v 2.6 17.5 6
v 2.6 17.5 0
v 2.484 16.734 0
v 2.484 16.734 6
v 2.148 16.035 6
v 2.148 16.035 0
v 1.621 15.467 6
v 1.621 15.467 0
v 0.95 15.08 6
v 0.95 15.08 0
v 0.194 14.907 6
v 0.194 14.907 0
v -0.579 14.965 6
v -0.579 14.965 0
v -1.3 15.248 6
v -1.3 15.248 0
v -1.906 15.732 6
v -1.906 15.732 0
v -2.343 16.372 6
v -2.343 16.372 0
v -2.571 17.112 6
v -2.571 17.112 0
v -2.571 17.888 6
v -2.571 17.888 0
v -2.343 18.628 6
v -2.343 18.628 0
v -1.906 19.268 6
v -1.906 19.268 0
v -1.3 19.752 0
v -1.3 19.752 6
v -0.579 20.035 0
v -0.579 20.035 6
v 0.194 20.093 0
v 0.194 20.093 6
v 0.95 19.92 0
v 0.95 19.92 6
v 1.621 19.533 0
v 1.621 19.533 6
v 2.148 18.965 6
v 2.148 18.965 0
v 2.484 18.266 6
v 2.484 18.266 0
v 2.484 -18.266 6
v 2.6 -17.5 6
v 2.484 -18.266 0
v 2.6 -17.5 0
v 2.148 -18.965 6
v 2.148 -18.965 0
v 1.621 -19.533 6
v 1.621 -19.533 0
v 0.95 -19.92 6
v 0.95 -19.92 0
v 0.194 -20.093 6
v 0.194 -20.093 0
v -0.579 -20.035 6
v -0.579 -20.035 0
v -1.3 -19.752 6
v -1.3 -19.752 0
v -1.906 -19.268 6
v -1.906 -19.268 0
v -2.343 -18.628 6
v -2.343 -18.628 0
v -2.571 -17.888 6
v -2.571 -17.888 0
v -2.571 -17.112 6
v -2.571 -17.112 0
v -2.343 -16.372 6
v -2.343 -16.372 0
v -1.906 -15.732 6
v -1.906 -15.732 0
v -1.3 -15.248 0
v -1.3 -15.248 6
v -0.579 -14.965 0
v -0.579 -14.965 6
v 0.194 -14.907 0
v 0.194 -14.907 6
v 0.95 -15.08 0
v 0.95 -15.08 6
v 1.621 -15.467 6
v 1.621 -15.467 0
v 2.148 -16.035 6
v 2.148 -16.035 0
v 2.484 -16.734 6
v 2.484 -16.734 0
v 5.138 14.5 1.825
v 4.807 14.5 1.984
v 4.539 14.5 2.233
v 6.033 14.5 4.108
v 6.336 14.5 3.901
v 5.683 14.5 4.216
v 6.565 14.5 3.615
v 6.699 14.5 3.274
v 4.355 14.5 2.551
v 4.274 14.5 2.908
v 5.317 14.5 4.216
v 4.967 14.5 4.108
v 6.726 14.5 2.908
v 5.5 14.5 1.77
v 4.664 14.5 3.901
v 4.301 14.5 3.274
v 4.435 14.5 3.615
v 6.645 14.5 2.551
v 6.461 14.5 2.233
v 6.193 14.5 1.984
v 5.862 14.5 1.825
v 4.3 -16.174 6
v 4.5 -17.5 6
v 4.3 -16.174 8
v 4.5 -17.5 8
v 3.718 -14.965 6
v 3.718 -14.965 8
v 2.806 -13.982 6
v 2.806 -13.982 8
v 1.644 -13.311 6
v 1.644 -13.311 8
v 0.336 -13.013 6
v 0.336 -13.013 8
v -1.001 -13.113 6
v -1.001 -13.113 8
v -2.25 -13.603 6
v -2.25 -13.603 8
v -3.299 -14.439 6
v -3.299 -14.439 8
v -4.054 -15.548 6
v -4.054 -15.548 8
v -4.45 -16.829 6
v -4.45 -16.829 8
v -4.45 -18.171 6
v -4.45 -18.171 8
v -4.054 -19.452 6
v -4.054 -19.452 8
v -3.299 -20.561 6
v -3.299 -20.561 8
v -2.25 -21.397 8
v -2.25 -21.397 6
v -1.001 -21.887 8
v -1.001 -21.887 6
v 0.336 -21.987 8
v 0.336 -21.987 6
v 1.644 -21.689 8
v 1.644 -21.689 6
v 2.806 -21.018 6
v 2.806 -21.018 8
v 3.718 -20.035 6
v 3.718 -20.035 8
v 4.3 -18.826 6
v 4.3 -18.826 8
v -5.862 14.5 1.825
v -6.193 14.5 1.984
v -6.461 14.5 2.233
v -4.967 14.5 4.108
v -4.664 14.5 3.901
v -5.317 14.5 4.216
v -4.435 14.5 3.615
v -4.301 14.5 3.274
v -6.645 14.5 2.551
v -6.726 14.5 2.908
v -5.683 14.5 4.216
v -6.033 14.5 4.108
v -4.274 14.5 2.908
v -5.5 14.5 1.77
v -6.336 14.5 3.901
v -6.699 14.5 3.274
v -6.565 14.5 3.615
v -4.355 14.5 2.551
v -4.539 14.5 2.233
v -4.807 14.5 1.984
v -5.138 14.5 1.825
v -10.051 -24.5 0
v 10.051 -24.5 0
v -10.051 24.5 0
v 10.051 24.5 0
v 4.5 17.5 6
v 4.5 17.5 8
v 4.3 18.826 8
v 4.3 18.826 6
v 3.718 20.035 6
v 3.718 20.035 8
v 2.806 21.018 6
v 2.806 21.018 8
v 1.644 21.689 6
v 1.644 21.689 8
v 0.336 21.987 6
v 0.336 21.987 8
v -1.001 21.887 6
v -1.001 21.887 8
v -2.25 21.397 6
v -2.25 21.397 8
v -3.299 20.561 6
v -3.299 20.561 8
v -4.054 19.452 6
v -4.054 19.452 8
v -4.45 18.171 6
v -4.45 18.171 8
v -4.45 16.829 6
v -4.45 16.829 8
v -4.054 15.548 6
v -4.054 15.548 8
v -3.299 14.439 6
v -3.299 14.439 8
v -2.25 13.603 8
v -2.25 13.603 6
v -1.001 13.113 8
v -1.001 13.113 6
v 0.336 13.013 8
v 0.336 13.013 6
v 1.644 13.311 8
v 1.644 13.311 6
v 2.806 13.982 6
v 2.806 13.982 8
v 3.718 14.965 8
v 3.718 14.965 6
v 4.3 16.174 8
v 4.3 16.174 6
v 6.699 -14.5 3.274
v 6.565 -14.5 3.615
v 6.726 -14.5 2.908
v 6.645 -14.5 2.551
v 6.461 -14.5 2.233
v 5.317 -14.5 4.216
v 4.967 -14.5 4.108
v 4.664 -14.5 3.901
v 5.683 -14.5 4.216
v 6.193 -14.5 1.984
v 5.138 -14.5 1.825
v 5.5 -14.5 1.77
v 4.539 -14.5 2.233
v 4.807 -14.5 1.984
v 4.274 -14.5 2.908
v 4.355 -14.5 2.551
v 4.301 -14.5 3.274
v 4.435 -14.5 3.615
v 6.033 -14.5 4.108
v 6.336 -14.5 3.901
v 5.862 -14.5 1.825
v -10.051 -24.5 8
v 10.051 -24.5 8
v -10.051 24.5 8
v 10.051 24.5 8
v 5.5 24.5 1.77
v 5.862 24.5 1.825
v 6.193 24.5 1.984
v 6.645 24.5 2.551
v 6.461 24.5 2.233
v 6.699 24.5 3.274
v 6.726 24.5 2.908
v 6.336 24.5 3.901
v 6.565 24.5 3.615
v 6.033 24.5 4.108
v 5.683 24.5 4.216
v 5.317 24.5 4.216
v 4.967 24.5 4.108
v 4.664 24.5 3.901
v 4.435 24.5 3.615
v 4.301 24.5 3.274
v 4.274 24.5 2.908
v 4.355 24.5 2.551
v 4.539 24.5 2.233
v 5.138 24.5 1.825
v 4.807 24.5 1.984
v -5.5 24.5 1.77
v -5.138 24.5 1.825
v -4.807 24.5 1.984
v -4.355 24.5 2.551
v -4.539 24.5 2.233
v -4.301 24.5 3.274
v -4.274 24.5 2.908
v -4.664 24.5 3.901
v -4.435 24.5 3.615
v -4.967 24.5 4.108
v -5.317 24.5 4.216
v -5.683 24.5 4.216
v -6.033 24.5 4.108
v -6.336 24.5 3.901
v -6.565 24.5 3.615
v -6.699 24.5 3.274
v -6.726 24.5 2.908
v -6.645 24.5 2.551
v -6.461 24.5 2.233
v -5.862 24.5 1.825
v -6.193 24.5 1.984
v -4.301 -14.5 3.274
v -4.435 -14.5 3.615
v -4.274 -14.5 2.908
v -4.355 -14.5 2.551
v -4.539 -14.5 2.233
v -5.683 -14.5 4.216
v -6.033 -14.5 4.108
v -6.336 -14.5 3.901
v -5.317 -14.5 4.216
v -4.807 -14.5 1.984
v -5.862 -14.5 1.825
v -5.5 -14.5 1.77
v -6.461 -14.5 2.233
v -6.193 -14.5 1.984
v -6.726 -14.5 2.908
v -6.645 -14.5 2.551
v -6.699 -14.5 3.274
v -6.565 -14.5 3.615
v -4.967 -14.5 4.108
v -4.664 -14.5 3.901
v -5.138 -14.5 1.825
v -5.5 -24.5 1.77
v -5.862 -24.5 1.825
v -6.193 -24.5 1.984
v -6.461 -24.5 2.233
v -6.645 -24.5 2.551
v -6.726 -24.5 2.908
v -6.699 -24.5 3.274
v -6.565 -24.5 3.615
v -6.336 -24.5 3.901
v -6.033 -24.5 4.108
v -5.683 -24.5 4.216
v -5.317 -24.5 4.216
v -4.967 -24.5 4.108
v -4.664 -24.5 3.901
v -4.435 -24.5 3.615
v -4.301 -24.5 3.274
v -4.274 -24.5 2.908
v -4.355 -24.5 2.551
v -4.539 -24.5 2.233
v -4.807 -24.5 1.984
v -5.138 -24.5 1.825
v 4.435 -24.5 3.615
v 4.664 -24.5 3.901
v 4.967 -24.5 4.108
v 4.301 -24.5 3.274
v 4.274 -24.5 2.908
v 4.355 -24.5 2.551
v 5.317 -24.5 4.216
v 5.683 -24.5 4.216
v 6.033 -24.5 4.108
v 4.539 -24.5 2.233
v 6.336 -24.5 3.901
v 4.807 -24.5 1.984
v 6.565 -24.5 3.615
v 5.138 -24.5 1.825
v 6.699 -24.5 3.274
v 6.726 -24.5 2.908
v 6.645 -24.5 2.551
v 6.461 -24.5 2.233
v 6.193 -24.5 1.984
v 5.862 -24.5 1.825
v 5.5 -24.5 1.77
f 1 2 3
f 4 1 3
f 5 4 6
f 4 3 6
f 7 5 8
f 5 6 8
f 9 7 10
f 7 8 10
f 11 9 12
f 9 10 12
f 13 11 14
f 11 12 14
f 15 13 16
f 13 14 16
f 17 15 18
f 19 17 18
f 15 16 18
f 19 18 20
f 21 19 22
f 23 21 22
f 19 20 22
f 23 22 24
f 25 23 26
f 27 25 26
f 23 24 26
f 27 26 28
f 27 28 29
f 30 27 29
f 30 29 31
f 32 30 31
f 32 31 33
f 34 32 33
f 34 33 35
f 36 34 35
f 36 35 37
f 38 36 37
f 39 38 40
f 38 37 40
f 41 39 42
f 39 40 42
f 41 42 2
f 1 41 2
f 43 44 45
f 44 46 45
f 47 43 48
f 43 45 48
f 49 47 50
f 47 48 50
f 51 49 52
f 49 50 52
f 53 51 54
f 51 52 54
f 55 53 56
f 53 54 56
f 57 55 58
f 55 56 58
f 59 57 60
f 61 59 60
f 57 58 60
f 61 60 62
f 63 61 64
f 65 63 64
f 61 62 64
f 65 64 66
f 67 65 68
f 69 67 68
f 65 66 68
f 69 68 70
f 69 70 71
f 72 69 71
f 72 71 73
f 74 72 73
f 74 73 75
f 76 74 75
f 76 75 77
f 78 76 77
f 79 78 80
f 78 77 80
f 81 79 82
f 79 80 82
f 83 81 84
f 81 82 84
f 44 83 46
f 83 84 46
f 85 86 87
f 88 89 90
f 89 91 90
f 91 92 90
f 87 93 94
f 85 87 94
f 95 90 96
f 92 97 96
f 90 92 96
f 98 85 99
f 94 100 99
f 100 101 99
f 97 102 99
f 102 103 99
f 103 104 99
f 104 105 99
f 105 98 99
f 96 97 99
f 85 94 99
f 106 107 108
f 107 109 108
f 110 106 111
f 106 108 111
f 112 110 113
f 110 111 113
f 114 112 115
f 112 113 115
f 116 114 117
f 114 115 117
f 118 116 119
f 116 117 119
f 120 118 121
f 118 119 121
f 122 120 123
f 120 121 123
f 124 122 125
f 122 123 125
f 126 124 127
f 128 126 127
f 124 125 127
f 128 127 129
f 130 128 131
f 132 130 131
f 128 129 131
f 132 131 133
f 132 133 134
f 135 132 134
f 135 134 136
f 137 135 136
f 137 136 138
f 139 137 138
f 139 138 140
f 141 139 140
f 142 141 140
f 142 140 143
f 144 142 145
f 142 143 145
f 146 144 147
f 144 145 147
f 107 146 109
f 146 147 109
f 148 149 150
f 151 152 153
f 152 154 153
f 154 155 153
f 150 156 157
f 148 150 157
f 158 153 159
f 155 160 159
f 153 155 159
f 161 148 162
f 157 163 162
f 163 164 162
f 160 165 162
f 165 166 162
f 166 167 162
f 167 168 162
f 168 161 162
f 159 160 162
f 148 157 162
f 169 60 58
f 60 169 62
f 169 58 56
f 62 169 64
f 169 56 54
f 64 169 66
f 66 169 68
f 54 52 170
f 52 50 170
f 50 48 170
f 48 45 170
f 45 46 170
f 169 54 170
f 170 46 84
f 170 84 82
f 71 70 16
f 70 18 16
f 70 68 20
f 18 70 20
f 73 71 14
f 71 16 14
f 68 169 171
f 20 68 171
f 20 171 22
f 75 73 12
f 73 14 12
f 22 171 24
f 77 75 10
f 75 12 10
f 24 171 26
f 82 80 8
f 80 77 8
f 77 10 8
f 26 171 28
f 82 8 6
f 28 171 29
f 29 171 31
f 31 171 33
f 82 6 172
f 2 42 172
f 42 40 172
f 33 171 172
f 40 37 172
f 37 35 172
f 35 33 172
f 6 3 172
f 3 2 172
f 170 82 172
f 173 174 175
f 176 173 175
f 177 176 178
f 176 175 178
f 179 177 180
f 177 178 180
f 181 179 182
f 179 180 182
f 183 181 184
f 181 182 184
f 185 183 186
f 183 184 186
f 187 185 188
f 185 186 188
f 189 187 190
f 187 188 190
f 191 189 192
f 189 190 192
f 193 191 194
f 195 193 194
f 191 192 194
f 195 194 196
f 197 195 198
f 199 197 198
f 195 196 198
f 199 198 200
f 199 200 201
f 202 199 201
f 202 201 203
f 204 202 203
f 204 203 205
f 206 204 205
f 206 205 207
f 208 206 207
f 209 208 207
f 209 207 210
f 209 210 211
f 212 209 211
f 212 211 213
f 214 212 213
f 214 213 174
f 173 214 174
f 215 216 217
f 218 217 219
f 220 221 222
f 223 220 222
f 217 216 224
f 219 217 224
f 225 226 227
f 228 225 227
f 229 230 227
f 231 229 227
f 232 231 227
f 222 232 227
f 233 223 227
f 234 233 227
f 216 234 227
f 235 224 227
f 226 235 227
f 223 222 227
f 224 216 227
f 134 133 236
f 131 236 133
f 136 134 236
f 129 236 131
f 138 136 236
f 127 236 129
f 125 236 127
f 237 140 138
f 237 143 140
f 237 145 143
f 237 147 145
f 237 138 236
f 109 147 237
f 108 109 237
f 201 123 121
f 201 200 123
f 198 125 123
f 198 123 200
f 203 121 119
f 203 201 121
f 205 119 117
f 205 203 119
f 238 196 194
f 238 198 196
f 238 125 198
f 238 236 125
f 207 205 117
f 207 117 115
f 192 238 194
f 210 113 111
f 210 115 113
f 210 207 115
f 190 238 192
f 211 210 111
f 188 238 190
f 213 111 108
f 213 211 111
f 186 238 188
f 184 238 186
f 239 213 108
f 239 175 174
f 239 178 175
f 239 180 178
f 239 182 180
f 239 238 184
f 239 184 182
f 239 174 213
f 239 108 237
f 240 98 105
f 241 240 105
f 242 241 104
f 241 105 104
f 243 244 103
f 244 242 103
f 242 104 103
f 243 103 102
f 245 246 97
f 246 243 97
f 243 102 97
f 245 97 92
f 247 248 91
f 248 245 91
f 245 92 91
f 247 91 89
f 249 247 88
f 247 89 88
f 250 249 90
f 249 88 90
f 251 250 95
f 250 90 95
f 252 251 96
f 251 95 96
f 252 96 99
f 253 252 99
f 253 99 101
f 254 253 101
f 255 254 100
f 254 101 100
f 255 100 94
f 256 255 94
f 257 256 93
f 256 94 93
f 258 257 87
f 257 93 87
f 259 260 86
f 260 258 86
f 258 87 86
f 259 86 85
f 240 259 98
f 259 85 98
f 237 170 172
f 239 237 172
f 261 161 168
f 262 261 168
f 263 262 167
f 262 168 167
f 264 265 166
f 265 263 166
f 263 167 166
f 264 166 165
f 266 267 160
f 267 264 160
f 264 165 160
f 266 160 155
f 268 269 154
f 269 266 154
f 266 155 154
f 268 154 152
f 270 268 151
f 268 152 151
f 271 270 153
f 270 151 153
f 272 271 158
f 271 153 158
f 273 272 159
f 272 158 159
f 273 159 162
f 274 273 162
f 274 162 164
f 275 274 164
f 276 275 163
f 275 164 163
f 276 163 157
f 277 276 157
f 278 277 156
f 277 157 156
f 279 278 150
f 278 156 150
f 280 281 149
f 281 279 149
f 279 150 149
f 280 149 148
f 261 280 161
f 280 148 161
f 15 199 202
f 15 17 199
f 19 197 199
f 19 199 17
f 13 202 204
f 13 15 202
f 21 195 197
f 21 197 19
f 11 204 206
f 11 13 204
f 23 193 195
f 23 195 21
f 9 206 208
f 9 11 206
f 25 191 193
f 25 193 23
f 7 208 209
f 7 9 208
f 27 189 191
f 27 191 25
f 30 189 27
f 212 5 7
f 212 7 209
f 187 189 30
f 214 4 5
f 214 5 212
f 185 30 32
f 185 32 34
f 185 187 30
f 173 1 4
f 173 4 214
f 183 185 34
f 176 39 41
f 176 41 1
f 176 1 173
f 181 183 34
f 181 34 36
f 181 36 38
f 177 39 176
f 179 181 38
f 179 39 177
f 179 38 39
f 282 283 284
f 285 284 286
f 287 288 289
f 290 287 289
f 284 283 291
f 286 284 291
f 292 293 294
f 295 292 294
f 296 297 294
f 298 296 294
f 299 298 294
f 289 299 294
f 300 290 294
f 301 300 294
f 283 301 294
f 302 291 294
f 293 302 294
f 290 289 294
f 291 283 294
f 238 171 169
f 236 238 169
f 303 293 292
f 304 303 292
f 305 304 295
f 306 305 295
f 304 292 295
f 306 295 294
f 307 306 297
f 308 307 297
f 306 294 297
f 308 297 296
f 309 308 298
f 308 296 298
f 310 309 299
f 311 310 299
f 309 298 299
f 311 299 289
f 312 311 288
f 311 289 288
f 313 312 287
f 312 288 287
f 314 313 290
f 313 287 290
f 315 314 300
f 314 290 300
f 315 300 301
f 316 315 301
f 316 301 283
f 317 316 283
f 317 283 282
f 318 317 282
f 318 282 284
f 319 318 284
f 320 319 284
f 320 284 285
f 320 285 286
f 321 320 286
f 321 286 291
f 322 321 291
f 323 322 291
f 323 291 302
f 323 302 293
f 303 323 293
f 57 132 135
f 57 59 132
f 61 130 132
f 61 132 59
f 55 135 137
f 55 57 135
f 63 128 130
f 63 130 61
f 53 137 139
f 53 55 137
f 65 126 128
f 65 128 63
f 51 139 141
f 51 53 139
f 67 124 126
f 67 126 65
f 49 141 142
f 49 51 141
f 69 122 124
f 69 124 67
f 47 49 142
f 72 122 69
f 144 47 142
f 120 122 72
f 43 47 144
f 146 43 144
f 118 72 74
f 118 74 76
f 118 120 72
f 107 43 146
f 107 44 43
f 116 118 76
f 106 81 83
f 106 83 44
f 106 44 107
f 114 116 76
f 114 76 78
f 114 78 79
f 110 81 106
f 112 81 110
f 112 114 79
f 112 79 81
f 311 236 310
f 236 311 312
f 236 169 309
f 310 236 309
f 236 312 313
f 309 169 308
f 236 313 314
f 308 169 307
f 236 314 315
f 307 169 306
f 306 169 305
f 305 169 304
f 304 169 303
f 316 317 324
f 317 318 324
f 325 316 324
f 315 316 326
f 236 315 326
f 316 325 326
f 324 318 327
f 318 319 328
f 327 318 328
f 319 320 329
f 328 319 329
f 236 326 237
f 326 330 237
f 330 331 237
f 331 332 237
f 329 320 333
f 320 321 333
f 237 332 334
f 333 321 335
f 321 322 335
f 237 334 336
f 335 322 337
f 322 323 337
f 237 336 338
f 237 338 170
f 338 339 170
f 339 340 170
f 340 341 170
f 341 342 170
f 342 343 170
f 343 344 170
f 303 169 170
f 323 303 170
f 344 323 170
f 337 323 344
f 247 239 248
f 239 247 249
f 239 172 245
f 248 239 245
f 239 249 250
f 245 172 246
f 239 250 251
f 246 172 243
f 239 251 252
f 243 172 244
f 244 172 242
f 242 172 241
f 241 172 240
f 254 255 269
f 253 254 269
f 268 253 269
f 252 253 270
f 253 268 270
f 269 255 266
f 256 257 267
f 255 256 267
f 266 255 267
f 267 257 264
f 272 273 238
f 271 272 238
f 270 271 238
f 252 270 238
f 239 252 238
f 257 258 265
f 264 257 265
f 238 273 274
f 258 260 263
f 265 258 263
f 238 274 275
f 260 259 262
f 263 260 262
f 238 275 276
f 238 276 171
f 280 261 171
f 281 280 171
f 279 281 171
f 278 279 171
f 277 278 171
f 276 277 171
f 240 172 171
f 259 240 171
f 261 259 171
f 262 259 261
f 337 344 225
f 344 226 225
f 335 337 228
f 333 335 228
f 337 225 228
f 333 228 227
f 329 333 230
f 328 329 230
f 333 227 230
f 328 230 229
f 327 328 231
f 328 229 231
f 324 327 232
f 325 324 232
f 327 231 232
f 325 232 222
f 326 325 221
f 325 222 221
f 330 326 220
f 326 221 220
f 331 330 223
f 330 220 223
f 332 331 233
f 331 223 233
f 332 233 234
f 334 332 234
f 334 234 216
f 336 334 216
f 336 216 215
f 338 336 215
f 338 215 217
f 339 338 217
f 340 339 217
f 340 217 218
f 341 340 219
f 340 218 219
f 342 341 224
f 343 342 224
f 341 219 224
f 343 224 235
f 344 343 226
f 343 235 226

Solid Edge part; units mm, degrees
sketch "Sketch1" plane through (0, 0, 0) normal (0, 0, 1) x (1, 0, 0)
  line L0 (-10.0513, -24.5) -> (10.0513, -24.5)
  line L1 (10.0513, -24.5) -> (10.0513, 24.5)
  line L2 (10.0513, 24.5) -> (-10.0513, 24.5)
  line L3 (-10.0513, 24.5) -> (-10.0513, -24.5)
  circle A0 centre (0, 17.5) radius 2.6
  circle A1 centre (0, -17.5) radius 2.6
  dimension "D1" = 17.5
  dimension "D2" = 17.5
extrude "Protrusion1" add sketch "Sketch1" along normal blind 8
sketch "Sketch2" plane through (0, 0, 8) normal (0, 0, 1) x (1, 0, 0)
  circle A0 centre (0, 17.5) radius 4.5
  circle A1 centre (0, -17.5) radius 4.5
extrude "ExtrudedCutout_1" cut sketch "Sketch2" against normal blind 2
hole "Hole_1" at (-5.5, -24.5, 3) direction (0, 1, 0) diameter 2.459 depth 10 thread major 3 thread length 8
hole "Hole1" at (5.5, -24.5, 3) direction (0, 1, 0) diameter 2.459 depth 10 thread major 3 thread length 8
mirror "Mirror1" about plane through (0, 0, 0) normal (0, 1, 0) of "Hole_1", "Hole1"
